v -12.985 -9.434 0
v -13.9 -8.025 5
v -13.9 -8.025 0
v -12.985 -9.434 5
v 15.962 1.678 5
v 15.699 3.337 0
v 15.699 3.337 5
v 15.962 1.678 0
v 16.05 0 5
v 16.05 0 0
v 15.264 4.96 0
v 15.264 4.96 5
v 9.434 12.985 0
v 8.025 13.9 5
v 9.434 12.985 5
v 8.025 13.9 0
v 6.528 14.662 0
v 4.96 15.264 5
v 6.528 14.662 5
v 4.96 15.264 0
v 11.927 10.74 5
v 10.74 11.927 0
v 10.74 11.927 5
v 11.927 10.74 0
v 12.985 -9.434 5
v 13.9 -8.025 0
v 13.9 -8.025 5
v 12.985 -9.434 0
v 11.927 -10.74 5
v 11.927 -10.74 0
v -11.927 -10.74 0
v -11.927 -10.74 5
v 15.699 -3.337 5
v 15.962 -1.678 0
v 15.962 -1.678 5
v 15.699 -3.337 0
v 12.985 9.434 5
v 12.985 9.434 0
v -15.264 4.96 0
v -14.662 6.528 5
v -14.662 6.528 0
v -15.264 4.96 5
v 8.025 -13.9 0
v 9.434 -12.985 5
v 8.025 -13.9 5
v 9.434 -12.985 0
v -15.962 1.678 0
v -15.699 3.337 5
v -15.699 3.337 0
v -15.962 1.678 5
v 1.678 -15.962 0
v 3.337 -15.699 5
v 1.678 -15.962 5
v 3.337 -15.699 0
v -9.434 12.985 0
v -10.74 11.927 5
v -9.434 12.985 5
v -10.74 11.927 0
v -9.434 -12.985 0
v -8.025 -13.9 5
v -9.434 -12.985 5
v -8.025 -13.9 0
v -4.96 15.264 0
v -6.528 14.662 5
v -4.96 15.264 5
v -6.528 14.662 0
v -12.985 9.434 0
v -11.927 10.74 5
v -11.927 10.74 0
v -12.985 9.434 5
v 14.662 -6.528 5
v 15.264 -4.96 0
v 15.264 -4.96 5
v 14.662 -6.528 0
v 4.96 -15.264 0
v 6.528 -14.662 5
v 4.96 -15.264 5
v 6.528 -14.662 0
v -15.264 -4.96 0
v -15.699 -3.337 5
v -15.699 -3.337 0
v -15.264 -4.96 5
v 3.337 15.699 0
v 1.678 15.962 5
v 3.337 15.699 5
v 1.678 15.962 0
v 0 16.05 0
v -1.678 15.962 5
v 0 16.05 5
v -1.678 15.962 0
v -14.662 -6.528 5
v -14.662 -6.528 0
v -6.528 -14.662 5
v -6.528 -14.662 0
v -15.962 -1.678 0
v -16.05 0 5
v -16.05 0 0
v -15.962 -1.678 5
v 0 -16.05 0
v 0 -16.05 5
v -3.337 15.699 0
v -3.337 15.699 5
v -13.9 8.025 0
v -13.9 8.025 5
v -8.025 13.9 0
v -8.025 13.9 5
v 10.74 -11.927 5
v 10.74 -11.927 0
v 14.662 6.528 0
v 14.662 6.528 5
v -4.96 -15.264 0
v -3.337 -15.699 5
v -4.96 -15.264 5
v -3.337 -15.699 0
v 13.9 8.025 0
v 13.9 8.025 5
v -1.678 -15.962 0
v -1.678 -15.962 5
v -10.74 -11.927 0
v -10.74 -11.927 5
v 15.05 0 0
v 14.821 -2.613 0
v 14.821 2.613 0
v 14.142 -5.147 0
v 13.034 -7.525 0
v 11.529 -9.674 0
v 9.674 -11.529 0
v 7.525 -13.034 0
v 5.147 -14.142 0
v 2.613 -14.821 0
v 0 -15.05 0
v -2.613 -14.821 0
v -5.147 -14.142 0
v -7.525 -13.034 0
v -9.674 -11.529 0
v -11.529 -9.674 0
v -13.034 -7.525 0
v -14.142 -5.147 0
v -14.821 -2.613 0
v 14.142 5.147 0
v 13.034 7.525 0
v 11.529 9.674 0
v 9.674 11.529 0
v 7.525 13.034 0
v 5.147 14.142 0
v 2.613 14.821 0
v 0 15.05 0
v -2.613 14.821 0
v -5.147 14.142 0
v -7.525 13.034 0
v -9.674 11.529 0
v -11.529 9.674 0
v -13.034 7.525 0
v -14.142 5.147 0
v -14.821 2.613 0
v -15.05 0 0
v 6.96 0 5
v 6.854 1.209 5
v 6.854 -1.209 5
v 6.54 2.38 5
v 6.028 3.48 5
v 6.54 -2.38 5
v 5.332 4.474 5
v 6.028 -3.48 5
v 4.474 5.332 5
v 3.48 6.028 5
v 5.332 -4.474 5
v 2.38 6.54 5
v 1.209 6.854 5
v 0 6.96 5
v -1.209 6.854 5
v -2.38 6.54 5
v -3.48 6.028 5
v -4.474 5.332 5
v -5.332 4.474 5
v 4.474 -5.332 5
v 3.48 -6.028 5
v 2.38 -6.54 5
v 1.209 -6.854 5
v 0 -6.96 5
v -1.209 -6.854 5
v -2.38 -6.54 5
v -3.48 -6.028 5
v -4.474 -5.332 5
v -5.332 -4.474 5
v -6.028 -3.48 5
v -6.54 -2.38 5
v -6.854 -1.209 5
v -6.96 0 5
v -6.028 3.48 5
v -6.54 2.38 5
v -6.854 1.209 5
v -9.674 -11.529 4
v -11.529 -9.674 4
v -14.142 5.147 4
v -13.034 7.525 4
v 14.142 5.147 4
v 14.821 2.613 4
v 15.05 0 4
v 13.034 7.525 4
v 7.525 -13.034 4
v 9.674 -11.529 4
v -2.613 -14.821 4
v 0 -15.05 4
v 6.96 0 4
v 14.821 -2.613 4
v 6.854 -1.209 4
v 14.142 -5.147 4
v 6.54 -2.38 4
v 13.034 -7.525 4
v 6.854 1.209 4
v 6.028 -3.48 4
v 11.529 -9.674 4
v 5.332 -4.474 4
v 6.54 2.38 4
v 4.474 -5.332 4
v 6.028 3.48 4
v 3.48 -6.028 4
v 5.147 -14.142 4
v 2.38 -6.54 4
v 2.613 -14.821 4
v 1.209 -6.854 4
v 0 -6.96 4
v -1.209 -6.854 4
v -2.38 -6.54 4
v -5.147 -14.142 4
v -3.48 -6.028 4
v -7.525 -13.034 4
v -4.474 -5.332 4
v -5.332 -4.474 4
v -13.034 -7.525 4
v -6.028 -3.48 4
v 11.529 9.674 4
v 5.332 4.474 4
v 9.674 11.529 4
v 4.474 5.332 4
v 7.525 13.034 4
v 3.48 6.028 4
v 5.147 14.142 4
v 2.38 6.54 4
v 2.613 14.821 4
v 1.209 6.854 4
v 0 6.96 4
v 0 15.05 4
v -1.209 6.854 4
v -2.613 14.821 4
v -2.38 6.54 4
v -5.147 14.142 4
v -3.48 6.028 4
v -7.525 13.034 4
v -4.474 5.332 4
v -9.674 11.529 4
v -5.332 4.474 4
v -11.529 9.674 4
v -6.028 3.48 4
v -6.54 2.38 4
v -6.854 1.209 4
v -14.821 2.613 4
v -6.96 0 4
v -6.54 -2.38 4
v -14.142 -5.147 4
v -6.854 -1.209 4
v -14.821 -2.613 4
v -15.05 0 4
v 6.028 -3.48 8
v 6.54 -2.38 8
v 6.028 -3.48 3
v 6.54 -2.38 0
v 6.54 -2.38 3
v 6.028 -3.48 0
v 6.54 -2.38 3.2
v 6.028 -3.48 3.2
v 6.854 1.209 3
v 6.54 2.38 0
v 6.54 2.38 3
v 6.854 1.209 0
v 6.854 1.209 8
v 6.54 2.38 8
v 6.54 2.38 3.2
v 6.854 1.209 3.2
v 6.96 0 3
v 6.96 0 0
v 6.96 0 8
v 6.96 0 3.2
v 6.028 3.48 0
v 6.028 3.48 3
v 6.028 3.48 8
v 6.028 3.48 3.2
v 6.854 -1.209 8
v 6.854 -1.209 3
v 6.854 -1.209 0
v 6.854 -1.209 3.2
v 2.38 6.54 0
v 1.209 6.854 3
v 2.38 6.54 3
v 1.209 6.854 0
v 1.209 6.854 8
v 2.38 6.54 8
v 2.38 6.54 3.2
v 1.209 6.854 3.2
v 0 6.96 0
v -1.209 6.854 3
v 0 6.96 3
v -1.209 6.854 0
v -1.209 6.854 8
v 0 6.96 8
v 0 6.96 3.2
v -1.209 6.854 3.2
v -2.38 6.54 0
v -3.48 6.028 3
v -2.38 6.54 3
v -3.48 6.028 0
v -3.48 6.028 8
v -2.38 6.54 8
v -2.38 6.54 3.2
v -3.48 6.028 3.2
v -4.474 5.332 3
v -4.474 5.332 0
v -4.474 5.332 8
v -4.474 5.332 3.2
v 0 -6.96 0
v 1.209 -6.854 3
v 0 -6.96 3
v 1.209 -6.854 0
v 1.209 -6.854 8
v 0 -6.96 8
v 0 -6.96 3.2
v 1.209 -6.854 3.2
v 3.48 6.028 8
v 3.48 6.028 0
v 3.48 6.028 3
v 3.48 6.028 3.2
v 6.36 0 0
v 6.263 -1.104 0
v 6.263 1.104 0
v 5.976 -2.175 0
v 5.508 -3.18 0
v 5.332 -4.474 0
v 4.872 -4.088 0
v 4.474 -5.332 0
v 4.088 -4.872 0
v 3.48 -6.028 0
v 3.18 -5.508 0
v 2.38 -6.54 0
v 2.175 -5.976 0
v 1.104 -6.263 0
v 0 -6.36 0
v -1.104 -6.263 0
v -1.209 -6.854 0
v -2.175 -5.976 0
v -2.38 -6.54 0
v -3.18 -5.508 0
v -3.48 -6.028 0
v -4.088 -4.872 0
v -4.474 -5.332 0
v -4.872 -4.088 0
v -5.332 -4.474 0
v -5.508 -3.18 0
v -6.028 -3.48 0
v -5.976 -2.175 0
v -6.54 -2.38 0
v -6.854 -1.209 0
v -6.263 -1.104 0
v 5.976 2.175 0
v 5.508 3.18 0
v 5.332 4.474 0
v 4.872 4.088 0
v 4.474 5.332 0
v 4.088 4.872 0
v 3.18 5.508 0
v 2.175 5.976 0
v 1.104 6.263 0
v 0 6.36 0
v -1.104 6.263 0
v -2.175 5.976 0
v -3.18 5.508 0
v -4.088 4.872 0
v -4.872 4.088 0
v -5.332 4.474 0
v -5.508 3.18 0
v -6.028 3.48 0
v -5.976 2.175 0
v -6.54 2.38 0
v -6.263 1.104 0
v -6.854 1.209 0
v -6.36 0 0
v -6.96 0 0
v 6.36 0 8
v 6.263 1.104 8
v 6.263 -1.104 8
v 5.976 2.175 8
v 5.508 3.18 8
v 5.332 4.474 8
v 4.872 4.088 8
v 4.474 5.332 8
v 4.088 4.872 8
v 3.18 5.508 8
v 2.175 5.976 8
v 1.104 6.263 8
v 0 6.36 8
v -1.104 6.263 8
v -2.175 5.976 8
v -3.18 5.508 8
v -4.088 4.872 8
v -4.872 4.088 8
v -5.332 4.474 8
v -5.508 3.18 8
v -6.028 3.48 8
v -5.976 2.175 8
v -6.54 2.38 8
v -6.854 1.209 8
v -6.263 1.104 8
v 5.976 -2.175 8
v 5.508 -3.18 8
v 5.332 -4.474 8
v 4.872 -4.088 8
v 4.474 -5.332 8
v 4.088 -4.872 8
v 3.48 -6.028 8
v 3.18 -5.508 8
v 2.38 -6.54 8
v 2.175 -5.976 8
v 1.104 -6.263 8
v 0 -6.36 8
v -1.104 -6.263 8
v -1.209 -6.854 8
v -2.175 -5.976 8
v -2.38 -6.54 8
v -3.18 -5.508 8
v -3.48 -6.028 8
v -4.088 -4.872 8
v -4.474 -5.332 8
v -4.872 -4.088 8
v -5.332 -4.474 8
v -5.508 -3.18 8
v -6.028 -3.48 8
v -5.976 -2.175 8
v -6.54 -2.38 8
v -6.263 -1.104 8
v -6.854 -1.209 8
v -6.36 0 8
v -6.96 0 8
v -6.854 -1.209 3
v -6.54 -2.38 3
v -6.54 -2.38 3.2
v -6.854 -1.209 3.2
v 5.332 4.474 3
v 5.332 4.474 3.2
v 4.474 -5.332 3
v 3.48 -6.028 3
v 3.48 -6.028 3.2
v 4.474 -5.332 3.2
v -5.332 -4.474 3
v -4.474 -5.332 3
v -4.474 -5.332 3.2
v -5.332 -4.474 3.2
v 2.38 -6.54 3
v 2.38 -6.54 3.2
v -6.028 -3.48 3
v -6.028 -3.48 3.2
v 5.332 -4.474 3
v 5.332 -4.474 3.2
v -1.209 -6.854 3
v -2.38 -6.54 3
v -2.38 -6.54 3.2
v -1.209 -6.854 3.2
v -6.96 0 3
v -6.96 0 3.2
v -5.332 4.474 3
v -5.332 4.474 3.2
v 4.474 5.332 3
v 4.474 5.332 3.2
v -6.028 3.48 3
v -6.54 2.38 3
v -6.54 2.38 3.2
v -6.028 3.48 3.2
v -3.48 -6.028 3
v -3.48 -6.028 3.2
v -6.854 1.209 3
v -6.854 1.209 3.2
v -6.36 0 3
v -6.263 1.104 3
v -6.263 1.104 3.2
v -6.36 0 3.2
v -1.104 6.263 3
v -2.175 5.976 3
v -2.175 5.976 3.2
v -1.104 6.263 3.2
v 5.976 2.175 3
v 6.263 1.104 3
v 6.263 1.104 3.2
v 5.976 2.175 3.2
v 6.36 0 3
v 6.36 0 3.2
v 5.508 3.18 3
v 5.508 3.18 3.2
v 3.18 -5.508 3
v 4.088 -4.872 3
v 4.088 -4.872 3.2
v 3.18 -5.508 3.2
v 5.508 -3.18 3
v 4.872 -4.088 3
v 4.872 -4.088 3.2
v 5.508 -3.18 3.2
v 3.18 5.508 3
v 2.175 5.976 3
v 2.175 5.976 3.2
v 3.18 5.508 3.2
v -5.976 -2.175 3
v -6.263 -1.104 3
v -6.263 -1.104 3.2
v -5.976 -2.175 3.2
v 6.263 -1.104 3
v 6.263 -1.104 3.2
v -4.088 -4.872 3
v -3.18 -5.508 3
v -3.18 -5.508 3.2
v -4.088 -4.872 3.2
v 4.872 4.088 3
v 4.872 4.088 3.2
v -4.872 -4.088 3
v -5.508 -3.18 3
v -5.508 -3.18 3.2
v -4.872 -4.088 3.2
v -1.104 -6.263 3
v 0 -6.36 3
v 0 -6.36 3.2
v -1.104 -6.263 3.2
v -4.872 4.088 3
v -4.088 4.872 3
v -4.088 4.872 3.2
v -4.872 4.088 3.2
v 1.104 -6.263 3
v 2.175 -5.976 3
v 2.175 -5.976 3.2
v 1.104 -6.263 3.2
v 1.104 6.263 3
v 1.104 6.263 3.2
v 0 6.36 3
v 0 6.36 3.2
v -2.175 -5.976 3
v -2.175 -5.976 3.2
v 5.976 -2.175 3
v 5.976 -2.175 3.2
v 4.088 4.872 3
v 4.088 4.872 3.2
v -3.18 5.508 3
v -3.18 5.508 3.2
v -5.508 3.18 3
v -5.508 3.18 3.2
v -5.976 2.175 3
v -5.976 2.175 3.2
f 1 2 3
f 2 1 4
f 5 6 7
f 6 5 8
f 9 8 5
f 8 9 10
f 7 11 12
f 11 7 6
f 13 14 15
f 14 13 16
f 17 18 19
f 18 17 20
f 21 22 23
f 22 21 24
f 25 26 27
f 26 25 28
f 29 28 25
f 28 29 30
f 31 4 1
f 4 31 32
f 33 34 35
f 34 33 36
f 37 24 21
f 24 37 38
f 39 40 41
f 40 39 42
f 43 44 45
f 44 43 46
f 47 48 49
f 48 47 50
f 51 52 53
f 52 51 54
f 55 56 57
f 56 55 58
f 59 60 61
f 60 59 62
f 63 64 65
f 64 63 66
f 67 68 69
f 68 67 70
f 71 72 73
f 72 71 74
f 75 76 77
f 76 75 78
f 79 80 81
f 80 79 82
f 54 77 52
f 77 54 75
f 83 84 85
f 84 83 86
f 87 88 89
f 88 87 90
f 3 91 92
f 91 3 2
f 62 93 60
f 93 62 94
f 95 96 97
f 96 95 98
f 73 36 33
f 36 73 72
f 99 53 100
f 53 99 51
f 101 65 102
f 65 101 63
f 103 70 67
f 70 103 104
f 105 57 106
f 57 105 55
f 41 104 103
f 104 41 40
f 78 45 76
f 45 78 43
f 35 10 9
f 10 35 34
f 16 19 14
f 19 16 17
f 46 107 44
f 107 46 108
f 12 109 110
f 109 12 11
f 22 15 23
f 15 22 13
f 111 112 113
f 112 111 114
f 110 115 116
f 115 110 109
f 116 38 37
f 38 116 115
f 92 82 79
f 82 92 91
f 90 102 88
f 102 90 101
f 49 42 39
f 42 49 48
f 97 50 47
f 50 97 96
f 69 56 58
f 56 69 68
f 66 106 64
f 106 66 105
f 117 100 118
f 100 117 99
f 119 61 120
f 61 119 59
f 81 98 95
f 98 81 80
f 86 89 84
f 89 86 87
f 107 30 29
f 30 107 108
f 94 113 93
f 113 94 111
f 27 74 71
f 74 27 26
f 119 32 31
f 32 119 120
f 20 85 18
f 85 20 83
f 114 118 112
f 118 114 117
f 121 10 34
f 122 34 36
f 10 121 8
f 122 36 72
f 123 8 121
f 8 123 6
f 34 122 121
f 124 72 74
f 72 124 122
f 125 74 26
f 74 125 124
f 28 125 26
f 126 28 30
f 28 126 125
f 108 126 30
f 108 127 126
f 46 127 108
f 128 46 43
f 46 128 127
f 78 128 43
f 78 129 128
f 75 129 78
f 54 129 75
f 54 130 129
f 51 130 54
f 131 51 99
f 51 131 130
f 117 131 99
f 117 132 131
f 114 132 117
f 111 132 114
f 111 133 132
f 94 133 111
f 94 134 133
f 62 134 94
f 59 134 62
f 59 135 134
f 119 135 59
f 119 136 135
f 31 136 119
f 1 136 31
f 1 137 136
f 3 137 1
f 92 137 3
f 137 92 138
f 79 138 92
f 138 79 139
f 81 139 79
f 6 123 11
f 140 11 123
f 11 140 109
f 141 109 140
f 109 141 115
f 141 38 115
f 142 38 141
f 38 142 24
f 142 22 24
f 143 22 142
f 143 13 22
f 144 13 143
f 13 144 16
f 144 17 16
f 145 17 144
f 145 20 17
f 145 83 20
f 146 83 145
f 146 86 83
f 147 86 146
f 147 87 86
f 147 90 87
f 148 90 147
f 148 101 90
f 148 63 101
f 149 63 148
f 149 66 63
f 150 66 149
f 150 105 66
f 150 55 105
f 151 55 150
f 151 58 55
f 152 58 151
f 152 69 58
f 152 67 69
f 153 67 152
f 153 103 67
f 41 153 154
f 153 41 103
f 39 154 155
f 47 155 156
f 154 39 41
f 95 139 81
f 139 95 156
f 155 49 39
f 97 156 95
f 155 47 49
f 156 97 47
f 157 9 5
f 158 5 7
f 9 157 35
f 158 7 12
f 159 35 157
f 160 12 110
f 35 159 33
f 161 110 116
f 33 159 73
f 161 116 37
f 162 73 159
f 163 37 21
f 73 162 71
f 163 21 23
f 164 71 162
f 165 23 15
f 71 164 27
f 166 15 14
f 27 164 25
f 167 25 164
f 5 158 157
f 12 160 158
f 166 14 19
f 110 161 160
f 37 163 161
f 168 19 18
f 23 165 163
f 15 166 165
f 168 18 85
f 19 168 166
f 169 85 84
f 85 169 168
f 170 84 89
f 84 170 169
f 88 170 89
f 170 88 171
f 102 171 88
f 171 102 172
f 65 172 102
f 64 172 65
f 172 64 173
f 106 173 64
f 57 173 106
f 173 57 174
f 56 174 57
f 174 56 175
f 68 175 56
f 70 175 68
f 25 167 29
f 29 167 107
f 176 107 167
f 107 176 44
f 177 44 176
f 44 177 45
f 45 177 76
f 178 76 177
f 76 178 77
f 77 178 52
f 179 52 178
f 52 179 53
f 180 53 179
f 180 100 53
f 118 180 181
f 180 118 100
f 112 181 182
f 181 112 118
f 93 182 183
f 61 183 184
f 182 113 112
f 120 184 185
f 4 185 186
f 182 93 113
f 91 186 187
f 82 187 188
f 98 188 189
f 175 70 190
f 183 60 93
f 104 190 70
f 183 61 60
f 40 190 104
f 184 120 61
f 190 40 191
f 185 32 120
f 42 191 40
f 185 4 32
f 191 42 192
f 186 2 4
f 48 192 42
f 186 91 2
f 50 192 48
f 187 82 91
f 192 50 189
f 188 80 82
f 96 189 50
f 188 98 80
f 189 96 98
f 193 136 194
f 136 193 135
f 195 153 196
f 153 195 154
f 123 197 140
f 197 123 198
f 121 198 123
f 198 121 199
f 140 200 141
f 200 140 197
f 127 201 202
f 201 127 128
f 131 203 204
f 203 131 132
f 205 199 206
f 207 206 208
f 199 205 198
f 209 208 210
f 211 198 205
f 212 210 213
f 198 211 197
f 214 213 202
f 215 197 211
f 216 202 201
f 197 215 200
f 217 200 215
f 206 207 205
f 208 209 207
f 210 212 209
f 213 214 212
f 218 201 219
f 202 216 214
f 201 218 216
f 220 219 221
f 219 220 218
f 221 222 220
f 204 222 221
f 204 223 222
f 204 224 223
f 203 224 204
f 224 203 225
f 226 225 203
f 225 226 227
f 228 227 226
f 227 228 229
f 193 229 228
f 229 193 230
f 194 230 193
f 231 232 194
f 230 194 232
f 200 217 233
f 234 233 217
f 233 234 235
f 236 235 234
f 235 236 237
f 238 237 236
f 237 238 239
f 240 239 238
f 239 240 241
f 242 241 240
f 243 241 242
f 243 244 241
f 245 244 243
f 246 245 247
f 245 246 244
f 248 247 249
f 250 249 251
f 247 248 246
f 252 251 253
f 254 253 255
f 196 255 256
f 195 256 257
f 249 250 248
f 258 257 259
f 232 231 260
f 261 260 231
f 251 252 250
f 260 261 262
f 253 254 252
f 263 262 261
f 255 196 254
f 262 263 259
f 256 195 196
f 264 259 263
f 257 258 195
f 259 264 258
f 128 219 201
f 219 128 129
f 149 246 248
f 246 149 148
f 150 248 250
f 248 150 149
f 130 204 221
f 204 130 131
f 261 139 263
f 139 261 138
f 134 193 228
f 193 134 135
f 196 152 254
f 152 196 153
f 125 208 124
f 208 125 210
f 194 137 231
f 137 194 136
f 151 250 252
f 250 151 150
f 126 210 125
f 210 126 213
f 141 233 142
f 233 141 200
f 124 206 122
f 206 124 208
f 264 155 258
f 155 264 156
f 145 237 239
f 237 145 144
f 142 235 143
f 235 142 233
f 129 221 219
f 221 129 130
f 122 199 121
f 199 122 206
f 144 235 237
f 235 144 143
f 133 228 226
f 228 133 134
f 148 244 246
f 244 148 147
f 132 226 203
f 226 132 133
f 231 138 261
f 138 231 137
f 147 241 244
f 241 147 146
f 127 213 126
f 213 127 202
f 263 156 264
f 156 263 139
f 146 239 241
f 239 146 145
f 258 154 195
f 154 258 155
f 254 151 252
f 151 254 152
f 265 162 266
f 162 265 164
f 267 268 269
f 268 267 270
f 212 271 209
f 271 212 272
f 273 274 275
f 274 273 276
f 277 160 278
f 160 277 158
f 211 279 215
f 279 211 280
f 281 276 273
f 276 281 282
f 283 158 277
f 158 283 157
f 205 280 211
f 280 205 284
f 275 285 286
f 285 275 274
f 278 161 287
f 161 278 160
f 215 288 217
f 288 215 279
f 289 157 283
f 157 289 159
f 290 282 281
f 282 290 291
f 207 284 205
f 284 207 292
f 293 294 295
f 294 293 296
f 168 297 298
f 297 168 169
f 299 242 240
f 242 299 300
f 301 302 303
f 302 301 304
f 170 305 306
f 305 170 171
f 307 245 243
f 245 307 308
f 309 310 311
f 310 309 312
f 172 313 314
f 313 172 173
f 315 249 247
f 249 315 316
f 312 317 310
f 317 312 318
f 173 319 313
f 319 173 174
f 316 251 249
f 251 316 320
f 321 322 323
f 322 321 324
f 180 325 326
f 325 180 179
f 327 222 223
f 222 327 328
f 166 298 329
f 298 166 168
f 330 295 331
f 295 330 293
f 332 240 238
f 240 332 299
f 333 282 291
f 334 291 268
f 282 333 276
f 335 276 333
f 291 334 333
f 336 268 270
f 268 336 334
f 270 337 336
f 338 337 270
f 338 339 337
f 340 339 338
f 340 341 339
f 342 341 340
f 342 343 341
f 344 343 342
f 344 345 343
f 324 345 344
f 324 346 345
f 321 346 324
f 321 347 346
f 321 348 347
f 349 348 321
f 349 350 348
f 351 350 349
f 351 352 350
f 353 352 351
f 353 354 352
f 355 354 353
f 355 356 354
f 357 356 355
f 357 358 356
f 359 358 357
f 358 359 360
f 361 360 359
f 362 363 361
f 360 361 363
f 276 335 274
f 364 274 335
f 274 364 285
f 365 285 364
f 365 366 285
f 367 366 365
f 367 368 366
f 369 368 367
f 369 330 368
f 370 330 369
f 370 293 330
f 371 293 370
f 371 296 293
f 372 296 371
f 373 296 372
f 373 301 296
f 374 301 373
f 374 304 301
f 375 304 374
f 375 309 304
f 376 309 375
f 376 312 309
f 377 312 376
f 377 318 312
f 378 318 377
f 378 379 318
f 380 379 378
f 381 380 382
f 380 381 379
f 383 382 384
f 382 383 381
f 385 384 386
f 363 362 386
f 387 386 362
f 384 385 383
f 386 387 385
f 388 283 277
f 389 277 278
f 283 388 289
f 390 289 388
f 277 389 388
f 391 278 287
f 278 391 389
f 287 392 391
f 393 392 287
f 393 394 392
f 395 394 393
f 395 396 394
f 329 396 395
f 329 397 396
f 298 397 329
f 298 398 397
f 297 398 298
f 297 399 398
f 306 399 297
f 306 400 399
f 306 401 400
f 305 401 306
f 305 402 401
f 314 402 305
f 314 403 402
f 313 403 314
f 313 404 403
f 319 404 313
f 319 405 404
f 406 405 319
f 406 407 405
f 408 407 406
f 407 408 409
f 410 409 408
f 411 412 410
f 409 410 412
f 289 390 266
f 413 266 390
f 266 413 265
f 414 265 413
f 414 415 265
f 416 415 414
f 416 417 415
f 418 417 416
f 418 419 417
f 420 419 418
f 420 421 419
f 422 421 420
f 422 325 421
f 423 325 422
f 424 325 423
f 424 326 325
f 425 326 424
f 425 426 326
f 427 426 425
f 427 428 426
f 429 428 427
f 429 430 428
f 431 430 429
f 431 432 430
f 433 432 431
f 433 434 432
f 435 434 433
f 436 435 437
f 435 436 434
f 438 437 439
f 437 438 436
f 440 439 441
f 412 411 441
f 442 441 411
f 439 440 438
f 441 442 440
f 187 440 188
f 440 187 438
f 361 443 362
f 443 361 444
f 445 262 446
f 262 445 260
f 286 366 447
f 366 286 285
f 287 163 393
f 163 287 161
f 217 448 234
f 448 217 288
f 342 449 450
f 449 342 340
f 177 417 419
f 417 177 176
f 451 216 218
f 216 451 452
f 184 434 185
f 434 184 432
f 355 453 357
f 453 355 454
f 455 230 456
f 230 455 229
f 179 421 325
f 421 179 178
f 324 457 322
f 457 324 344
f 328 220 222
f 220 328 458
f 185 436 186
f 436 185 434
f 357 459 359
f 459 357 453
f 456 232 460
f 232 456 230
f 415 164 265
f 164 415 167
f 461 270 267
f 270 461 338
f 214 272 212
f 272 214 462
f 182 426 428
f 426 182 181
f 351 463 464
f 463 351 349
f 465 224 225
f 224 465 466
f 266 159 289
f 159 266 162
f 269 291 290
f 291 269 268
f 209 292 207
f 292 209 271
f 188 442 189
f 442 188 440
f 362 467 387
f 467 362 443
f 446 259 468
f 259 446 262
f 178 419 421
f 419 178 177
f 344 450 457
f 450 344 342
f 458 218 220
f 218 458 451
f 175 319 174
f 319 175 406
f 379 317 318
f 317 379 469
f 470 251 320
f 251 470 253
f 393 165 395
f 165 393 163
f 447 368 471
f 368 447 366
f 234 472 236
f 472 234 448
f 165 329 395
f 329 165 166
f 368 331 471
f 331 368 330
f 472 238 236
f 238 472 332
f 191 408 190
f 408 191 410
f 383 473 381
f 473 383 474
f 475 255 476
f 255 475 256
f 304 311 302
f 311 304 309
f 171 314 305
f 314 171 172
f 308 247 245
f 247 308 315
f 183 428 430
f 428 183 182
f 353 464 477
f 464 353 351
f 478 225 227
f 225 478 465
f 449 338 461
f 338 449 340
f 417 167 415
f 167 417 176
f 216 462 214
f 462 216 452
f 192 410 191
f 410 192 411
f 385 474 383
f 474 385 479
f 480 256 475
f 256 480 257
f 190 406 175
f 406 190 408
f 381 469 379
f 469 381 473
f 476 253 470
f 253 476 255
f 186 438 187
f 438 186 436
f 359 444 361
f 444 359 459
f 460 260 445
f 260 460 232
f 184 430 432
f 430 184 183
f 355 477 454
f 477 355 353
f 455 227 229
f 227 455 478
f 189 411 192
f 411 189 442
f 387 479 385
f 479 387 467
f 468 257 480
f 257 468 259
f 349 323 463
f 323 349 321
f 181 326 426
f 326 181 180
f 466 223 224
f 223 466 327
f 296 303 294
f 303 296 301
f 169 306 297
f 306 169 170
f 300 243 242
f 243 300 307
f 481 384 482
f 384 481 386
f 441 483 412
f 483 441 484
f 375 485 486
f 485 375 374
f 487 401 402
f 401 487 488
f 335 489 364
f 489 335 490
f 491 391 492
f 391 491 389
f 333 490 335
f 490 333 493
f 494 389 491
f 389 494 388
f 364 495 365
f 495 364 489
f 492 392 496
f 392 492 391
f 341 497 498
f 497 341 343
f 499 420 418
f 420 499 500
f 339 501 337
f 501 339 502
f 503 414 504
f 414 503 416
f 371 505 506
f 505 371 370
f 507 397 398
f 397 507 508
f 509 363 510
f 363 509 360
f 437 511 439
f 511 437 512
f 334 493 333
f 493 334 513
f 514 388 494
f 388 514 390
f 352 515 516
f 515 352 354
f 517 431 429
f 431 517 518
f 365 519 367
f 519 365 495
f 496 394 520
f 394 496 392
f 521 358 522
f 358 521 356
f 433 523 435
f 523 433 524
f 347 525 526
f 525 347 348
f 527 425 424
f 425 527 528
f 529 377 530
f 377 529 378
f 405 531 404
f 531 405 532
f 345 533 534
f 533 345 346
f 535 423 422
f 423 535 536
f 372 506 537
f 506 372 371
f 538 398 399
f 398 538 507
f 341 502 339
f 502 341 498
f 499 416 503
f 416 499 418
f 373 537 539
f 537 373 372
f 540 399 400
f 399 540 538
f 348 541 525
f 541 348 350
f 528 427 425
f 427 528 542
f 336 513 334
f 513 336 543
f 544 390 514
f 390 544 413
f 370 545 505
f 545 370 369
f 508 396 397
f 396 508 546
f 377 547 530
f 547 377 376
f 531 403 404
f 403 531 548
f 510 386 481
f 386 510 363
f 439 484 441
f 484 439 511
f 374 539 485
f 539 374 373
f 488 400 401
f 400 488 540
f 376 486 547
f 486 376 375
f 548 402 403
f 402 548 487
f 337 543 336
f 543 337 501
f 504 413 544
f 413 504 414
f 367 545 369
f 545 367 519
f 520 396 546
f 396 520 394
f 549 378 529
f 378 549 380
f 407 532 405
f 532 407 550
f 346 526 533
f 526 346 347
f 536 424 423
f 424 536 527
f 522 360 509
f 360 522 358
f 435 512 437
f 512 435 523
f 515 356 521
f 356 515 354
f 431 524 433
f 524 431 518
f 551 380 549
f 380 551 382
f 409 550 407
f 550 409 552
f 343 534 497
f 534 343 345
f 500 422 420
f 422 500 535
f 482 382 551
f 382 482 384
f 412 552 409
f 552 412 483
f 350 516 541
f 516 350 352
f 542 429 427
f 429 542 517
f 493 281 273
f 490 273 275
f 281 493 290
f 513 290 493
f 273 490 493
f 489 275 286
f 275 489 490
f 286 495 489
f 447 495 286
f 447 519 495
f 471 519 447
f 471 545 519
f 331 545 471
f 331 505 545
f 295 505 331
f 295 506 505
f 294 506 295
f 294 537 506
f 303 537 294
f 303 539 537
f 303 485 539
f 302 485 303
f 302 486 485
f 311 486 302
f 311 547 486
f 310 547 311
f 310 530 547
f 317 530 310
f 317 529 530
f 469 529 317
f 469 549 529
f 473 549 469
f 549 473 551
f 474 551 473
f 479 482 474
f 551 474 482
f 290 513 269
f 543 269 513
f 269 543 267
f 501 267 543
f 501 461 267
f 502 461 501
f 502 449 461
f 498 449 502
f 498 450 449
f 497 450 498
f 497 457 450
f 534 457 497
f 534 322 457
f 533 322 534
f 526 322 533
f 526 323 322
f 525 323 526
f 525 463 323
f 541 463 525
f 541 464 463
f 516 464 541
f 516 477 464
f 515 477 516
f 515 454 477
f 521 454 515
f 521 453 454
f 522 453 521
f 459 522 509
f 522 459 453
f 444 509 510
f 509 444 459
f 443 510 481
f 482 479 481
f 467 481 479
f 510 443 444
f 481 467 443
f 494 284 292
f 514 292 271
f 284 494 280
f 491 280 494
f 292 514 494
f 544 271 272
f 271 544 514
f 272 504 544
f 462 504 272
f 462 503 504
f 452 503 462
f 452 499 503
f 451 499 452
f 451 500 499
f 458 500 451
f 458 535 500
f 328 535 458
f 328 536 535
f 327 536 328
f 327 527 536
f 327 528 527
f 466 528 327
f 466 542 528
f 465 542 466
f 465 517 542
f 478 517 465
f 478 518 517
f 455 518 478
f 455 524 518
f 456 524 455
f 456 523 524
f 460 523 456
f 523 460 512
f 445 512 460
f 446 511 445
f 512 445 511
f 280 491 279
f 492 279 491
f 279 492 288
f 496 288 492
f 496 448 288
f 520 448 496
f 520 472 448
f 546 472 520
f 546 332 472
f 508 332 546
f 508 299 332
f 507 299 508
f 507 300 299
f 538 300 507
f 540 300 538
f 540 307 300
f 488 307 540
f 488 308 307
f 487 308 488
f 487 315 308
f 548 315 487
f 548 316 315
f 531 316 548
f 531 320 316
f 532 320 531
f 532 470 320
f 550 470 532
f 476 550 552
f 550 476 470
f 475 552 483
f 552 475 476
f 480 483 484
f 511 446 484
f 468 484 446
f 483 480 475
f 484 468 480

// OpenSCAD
// Customizable Egg Holder

/* [parameter] */

//The diameter of the bottom of the egg.
egg_holder_outer_diameter=13.92;

egg_holder_wall_thickness=1.2;

egg_holder_height=3;

//The diameter of the Compact LED Light for CR2032.
base_inner_diameter=30.1;

base_wall_thickness=2;

base_height=5;


/* [Hidden] */


difference() {
    union() {
        //base
        difference() {
            cylinder(h=base_height, d=(base_inner_diameter+base_wall_thickness), $fn=60);
            translate([0,0,-0.05]) 
                cylinder(h=(base_height-0.95), d=base_inner_diameter,$fn=36);
        }
        
        //egg holder
        cylinder(h=(egg_holder_height+base_height), d=egg_holder_outer_diameter, $fn=36);
    }
    
    //egg holder hole
    translate([0,0,-0.05])
        cylinder(h=(egg_holder_height+base_height+0.1), d=(egg_holder_outer_diameter-egg_holder_wall_thickness), $fn=36);
    
    //support break
    translate([0,0,(base_height-2)])
        cylinder(h=0.2, d=(egg_holder_outer_diameter+2), $fn=36);
}
